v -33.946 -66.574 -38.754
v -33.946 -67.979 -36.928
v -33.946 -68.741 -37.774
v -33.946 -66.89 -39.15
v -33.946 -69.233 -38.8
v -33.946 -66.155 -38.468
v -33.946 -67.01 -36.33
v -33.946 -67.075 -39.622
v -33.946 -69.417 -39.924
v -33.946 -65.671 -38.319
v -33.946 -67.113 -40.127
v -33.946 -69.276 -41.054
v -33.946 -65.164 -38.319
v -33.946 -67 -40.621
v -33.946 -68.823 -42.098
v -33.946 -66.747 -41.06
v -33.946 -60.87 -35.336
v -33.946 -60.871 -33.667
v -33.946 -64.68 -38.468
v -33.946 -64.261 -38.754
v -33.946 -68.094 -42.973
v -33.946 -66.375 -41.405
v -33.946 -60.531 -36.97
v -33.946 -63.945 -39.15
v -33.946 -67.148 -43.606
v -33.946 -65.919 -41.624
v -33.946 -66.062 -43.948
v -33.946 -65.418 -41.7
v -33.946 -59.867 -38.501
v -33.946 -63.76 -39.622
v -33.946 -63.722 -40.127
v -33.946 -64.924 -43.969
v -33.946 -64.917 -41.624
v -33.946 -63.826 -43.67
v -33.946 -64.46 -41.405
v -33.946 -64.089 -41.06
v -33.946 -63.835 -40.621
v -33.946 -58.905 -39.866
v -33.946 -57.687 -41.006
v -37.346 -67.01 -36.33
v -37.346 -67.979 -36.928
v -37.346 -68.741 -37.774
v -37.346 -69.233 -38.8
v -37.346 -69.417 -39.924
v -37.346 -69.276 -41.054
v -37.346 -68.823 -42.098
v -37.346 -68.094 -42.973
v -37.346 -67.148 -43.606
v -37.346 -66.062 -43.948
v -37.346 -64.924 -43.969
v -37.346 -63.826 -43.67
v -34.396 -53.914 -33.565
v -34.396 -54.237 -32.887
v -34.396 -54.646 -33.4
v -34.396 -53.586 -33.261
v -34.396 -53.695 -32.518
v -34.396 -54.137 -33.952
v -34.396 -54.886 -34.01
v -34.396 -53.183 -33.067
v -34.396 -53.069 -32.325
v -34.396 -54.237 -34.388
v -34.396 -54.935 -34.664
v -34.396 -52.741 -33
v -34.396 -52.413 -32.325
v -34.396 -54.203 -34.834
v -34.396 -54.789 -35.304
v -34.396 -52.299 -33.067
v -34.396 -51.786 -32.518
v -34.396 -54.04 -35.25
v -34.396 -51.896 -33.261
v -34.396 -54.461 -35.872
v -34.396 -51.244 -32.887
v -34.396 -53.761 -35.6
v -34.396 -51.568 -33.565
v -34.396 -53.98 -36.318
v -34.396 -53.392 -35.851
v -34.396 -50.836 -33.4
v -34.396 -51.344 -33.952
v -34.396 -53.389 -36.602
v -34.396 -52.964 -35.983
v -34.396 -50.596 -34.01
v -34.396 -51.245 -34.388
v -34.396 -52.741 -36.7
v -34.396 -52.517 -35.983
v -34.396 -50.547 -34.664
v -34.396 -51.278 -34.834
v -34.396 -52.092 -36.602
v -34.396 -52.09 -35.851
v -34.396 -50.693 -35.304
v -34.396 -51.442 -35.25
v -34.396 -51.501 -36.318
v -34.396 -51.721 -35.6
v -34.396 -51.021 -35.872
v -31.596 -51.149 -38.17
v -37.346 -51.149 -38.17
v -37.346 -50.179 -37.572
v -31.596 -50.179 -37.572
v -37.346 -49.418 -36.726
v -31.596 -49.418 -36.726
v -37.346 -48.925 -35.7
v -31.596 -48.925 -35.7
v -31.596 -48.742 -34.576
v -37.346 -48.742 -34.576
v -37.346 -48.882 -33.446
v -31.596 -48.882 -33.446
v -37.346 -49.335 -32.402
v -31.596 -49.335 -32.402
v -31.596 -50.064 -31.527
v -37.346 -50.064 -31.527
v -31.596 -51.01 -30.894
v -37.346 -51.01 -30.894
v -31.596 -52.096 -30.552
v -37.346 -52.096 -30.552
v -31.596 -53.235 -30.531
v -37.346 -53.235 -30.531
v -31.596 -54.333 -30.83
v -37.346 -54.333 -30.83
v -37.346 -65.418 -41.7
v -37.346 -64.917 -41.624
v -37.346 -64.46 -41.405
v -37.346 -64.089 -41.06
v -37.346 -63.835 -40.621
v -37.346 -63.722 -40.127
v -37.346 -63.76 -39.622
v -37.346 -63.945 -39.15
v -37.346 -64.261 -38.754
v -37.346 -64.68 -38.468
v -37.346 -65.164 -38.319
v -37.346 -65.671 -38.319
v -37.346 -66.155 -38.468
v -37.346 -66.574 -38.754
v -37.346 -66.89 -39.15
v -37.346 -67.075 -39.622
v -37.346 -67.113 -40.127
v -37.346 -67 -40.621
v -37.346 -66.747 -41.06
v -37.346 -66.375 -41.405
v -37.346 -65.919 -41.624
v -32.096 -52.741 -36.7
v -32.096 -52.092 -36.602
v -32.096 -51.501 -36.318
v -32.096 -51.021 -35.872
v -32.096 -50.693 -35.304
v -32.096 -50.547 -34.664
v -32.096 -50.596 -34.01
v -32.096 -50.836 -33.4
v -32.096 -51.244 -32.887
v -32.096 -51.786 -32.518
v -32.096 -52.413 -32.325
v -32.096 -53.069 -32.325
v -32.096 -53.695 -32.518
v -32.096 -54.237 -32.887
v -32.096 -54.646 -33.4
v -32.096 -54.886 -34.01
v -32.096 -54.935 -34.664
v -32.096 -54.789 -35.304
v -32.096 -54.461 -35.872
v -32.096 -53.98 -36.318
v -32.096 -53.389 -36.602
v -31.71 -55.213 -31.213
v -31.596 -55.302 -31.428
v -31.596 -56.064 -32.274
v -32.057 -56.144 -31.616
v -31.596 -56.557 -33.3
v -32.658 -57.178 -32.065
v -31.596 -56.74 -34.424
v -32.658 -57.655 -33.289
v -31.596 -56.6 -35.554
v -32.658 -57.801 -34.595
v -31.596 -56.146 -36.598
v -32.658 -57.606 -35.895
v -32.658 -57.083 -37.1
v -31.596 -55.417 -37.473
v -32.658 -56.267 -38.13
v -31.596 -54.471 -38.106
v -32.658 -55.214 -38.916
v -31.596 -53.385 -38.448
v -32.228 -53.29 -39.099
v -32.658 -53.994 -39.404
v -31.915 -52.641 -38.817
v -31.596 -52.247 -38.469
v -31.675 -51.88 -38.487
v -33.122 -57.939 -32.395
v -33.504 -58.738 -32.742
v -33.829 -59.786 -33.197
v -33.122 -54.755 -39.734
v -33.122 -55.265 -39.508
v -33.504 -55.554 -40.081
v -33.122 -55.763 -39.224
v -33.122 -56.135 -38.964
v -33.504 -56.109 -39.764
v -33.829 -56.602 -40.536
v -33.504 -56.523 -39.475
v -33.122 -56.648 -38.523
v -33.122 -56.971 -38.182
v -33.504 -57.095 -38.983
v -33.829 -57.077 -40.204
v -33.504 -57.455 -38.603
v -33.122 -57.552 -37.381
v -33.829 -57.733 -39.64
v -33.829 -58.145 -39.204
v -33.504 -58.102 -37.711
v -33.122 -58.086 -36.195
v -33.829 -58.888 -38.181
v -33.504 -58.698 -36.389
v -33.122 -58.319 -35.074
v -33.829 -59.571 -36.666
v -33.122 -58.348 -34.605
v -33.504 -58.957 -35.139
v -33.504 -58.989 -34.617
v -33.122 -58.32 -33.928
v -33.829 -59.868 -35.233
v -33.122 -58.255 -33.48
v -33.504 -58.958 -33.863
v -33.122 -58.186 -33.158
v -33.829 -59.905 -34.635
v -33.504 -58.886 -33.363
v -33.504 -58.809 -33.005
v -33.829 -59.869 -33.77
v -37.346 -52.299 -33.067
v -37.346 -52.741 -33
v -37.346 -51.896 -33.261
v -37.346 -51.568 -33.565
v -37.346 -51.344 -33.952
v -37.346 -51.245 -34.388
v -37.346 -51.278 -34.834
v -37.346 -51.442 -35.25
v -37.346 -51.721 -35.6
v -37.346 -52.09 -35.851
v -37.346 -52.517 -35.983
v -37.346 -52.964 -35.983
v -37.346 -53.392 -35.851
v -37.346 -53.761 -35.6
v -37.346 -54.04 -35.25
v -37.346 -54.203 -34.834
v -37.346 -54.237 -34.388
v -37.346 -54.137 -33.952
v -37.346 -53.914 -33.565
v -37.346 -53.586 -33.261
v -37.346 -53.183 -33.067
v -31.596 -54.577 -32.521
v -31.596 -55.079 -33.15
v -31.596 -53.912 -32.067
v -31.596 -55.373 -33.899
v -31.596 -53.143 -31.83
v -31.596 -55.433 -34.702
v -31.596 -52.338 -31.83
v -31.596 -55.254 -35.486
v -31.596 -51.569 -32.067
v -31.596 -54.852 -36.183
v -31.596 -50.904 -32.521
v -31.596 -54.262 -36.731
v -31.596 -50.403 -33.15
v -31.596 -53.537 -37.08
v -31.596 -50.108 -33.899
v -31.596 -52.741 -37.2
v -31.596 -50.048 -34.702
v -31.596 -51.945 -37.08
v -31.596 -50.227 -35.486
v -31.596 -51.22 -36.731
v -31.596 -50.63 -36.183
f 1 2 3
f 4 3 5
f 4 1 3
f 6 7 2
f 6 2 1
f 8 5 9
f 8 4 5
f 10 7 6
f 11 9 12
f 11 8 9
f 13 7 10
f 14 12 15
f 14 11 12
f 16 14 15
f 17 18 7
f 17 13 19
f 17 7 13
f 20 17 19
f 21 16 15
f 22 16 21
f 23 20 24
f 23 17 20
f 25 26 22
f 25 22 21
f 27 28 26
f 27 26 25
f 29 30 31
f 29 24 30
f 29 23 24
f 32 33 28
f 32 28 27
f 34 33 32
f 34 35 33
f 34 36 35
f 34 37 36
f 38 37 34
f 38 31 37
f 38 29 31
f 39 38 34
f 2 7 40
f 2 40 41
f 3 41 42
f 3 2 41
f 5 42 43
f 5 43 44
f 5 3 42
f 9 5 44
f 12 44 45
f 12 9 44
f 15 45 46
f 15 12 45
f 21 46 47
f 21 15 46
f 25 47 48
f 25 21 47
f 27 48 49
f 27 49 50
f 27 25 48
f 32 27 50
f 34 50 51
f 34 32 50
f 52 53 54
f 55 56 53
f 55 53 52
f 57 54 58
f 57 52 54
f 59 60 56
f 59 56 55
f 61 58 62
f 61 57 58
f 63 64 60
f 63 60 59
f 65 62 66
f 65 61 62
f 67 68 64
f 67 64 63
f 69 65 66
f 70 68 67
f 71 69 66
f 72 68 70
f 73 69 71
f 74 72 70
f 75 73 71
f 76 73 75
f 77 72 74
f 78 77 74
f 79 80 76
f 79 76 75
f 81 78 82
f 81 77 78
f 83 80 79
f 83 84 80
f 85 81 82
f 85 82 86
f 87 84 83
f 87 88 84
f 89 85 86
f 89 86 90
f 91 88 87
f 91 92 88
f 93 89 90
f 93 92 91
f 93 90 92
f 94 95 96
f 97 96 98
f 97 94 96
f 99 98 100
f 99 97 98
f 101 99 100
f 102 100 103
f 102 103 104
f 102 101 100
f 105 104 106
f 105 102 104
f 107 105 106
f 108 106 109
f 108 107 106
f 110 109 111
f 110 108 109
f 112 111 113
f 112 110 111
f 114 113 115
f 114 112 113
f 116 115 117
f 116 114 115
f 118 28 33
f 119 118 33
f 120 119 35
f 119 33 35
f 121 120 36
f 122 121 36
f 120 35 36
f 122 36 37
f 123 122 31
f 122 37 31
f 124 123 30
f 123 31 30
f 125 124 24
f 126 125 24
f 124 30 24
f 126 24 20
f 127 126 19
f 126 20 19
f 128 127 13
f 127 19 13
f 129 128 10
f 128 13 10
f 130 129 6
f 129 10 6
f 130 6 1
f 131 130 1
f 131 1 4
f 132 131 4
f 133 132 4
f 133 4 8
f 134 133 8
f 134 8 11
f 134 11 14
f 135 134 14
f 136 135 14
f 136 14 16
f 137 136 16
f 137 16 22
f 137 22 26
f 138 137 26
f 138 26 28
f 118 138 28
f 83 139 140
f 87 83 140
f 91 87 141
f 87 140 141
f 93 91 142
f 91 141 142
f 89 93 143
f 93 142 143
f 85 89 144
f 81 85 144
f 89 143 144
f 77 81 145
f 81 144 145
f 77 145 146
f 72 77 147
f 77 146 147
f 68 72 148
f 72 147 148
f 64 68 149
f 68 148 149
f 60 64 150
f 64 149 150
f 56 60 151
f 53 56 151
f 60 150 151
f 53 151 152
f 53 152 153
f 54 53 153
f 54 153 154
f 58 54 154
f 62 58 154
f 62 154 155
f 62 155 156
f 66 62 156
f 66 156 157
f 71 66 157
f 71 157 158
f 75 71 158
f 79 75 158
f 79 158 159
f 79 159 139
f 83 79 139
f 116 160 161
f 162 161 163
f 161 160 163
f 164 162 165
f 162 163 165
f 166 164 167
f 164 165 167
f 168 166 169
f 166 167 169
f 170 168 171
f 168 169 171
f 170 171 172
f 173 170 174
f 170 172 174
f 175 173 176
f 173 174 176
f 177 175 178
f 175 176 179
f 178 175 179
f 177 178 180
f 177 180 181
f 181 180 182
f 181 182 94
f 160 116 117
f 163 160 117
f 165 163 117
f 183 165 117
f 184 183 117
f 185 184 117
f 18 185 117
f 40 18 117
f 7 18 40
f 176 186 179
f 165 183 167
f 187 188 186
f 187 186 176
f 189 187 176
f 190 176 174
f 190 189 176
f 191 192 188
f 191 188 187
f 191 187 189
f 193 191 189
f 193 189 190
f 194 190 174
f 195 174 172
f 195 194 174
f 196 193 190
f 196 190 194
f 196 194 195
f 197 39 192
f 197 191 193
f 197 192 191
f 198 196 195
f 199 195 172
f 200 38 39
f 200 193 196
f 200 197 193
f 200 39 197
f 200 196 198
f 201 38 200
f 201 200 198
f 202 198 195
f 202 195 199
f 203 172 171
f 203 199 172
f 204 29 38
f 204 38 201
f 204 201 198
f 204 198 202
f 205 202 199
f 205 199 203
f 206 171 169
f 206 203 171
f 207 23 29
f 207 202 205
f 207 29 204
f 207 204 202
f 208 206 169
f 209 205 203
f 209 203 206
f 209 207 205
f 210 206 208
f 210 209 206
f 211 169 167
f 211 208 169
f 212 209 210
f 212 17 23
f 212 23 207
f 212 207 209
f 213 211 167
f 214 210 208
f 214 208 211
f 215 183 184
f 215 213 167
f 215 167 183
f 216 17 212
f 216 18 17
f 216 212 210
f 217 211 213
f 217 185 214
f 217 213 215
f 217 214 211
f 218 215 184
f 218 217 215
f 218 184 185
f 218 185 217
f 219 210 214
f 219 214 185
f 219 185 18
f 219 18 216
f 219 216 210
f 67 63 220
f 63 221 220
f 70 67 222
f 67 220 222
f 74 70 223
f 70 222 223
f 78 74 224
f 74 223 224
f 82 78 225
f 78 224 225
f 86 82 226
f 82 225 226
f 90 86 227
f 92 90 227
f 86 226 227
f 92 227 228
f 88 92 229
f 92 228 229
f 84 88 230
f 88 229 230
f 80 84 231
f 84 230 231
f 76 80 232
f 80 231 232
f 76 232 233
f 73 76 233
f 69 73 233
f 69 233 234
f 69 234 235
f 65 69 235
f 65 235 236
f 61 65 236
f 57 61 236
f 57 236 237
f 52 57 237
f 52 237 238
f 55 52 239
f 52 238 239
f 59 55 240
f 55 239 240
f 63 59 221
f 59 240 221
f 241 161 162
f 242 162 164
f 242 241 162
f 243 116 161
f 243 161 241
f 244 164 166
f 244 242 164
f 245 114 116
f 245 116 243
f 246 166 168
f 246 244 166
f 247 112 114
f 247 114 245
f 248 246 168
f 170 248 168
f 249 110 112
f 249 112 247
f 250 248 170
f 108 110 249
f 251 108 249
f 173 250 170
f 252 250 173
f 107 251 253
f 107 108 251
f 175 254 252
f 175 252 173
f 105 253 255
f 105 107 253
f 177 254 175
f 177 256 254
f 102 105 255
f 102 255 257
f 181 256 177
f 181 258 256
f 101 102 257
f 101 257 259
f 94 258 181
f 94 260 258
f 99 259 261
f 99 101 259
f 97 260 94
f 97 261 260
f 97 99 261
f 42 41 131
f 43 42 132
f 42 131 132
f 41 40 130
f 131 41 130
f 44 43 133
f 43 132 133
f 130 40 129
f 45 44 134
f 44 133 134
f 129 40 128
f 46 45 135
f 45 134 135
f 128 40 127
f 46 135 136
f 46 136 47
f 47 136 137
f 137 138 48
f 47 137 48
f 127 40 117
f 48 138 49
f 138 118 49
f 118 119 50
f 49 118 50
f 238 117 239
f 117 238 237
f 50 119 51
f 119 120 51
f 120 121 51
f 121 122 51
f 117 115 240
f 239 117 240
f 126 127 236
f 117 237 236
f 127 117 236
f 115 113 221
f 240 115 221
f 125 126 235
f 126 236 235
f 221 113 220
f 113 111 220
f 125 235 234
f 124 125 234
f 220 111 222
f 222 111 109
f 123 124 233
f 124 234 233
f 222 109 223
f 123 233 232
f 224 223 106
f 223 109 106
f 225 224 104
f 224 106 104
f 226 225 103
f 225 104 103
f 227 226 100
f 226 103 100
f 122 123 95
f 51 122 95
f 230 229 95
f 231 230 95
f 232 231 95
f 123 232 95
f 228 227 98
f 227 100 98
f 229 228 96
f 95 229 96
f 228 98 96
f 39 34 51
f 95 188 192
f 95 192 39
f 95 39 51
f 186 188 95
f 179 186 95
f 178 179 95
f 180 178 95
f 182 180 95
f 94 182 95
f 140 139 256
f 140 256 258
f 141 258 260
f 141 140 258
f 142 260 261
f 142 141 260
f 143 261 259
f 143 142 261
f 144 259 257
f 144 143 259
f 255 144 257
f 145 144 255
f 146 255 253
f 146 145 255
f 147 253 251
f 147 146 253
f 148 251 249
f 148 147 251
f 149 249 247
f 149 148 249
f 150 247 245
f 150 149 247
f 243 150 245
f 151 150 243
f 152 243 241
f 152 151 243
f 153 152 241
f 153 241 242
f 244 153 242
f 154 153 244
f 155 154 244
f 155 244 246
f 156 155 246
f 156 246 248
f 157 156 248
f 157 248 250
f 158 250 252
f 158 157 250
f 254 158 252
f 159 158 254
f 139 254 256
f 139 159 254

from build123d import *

# Parameters (mm, degrees)
BOSS_EXTRUDE1_DEPTH = 5.75
CUT_EXTRUDE1_DEPTH  = 2.35
HOLE1_D             = 3.4
HOLE2_D             = 3
HOLE2_CBORE_D       = 4.4
HOLE2_CBORE_DEPTH   = 2.8
CHAMFER1_SIZE       = 0.5
FILLET1_R           = 4.4


# Read off the part's stored shape, not the designer's step: Draft1
with BuildPart() as part:
    # Sketch1 → Boss-Extrude1 (new body)
    with BuildSketch(Plane(origin=(-31.596370889, 0, 0), x_dir=(0, 0, -1), z_dir=(1, 0, 0))):
        with BuildLine():
            Line((30.830485373, -54.332845156), (36.330485373, -67.009692228))
            ThreePointArc((36.330485373, -67.009692228), (41.592062311, -69.087144543), (43.669514627, -63.825567605))
            Line((43.669514627, -63.825567605), (38.169514627, -51.148720534))
            ThreePointArc((38.169514627, -51.148720534), (32.907937689, -49.071268218), (30.830485373, -54.332845156))
        make_face()
    extrude(amount=-BOSS_EXTRUDE1_DEPTH)

    # Sketch2 → Cut-Extrude1 (cut)
    with BuildSketch(Plane(origin=(-31.596370889, 0, 0), x_dir=(0, 0, -1), z_dir=(1, 0, 0))):
        with BuildLine():
            Line((32.793412497, -58.857159149), (36.330485373, -67.009692228))
            ThreePointArc((36.330485373, -67.009692228), (41.592062311, -69.087144543), (43.669514627, -63.825567605))
            Line((43.669514627, -63.825567605), (40.132441751, -55.673034527))
            ThreePointArc((40.132441751, -55.673034527), (37.027398919, -58.566137315), (32.793412497, -58.857159149))
        make_face()
    extrude(amount=-CUT_EXTRUDE1_DEPTH, mode=Mode.SUBTRACT)

    # Draft1 outline → Draft1 (revolve, cut)
    with BuildSketch(Plane(origin=(0, -52.740782845, -34.5), x_dir=(0, 1, 0), z_dir=(0, 0, -1))):
        Polygon((6.35, -31.596367589), (3.9999967, -31.596367589), (6.35, -33.946370889), align=None)
    revolve(axis=Axis((0, -52.740782845, -34.5), (1, 0, 0)), mode=Mode.SUBTRACT)

    # Hole1 (through all)
    with Locations(Plane.ZY.offset(37.346370889)):
        with Locations((-40, -65.417629916)):
            Hole(HOLE1_D / 2)

    # Hole2 (through all)
    with Locations(Plane(origin=(-31.596370889, 0, 0), x_dir=(0, 0, -1), z_dir=(1, 0, 0))):
        with Locations((34.5, -52.740782845)):
            CounterBoreHole(HOLE2_D / 2, HOLE2_CBORE_D / 2, HOLE2_CBORE_DEPTH)

    # Chamfer1
    chamfer1_edges = [part.edges().sort_by_distance(p)[0] for p in [
        (-31.596370889, -52.740782845, -32.3),
    ]]
    chamfer(chamfer1_edges, length=CHAMFER1_SIZE)

    # Fillet1
    fillet1_edges = [part.edges().sort_by_distance(p)[0] for p in [
        (-33.946370889, -58.566137315, -37.027398919),
    ]]
    fillet(fillet1_edges, radius=FILLET1_R)


solid = part.part
